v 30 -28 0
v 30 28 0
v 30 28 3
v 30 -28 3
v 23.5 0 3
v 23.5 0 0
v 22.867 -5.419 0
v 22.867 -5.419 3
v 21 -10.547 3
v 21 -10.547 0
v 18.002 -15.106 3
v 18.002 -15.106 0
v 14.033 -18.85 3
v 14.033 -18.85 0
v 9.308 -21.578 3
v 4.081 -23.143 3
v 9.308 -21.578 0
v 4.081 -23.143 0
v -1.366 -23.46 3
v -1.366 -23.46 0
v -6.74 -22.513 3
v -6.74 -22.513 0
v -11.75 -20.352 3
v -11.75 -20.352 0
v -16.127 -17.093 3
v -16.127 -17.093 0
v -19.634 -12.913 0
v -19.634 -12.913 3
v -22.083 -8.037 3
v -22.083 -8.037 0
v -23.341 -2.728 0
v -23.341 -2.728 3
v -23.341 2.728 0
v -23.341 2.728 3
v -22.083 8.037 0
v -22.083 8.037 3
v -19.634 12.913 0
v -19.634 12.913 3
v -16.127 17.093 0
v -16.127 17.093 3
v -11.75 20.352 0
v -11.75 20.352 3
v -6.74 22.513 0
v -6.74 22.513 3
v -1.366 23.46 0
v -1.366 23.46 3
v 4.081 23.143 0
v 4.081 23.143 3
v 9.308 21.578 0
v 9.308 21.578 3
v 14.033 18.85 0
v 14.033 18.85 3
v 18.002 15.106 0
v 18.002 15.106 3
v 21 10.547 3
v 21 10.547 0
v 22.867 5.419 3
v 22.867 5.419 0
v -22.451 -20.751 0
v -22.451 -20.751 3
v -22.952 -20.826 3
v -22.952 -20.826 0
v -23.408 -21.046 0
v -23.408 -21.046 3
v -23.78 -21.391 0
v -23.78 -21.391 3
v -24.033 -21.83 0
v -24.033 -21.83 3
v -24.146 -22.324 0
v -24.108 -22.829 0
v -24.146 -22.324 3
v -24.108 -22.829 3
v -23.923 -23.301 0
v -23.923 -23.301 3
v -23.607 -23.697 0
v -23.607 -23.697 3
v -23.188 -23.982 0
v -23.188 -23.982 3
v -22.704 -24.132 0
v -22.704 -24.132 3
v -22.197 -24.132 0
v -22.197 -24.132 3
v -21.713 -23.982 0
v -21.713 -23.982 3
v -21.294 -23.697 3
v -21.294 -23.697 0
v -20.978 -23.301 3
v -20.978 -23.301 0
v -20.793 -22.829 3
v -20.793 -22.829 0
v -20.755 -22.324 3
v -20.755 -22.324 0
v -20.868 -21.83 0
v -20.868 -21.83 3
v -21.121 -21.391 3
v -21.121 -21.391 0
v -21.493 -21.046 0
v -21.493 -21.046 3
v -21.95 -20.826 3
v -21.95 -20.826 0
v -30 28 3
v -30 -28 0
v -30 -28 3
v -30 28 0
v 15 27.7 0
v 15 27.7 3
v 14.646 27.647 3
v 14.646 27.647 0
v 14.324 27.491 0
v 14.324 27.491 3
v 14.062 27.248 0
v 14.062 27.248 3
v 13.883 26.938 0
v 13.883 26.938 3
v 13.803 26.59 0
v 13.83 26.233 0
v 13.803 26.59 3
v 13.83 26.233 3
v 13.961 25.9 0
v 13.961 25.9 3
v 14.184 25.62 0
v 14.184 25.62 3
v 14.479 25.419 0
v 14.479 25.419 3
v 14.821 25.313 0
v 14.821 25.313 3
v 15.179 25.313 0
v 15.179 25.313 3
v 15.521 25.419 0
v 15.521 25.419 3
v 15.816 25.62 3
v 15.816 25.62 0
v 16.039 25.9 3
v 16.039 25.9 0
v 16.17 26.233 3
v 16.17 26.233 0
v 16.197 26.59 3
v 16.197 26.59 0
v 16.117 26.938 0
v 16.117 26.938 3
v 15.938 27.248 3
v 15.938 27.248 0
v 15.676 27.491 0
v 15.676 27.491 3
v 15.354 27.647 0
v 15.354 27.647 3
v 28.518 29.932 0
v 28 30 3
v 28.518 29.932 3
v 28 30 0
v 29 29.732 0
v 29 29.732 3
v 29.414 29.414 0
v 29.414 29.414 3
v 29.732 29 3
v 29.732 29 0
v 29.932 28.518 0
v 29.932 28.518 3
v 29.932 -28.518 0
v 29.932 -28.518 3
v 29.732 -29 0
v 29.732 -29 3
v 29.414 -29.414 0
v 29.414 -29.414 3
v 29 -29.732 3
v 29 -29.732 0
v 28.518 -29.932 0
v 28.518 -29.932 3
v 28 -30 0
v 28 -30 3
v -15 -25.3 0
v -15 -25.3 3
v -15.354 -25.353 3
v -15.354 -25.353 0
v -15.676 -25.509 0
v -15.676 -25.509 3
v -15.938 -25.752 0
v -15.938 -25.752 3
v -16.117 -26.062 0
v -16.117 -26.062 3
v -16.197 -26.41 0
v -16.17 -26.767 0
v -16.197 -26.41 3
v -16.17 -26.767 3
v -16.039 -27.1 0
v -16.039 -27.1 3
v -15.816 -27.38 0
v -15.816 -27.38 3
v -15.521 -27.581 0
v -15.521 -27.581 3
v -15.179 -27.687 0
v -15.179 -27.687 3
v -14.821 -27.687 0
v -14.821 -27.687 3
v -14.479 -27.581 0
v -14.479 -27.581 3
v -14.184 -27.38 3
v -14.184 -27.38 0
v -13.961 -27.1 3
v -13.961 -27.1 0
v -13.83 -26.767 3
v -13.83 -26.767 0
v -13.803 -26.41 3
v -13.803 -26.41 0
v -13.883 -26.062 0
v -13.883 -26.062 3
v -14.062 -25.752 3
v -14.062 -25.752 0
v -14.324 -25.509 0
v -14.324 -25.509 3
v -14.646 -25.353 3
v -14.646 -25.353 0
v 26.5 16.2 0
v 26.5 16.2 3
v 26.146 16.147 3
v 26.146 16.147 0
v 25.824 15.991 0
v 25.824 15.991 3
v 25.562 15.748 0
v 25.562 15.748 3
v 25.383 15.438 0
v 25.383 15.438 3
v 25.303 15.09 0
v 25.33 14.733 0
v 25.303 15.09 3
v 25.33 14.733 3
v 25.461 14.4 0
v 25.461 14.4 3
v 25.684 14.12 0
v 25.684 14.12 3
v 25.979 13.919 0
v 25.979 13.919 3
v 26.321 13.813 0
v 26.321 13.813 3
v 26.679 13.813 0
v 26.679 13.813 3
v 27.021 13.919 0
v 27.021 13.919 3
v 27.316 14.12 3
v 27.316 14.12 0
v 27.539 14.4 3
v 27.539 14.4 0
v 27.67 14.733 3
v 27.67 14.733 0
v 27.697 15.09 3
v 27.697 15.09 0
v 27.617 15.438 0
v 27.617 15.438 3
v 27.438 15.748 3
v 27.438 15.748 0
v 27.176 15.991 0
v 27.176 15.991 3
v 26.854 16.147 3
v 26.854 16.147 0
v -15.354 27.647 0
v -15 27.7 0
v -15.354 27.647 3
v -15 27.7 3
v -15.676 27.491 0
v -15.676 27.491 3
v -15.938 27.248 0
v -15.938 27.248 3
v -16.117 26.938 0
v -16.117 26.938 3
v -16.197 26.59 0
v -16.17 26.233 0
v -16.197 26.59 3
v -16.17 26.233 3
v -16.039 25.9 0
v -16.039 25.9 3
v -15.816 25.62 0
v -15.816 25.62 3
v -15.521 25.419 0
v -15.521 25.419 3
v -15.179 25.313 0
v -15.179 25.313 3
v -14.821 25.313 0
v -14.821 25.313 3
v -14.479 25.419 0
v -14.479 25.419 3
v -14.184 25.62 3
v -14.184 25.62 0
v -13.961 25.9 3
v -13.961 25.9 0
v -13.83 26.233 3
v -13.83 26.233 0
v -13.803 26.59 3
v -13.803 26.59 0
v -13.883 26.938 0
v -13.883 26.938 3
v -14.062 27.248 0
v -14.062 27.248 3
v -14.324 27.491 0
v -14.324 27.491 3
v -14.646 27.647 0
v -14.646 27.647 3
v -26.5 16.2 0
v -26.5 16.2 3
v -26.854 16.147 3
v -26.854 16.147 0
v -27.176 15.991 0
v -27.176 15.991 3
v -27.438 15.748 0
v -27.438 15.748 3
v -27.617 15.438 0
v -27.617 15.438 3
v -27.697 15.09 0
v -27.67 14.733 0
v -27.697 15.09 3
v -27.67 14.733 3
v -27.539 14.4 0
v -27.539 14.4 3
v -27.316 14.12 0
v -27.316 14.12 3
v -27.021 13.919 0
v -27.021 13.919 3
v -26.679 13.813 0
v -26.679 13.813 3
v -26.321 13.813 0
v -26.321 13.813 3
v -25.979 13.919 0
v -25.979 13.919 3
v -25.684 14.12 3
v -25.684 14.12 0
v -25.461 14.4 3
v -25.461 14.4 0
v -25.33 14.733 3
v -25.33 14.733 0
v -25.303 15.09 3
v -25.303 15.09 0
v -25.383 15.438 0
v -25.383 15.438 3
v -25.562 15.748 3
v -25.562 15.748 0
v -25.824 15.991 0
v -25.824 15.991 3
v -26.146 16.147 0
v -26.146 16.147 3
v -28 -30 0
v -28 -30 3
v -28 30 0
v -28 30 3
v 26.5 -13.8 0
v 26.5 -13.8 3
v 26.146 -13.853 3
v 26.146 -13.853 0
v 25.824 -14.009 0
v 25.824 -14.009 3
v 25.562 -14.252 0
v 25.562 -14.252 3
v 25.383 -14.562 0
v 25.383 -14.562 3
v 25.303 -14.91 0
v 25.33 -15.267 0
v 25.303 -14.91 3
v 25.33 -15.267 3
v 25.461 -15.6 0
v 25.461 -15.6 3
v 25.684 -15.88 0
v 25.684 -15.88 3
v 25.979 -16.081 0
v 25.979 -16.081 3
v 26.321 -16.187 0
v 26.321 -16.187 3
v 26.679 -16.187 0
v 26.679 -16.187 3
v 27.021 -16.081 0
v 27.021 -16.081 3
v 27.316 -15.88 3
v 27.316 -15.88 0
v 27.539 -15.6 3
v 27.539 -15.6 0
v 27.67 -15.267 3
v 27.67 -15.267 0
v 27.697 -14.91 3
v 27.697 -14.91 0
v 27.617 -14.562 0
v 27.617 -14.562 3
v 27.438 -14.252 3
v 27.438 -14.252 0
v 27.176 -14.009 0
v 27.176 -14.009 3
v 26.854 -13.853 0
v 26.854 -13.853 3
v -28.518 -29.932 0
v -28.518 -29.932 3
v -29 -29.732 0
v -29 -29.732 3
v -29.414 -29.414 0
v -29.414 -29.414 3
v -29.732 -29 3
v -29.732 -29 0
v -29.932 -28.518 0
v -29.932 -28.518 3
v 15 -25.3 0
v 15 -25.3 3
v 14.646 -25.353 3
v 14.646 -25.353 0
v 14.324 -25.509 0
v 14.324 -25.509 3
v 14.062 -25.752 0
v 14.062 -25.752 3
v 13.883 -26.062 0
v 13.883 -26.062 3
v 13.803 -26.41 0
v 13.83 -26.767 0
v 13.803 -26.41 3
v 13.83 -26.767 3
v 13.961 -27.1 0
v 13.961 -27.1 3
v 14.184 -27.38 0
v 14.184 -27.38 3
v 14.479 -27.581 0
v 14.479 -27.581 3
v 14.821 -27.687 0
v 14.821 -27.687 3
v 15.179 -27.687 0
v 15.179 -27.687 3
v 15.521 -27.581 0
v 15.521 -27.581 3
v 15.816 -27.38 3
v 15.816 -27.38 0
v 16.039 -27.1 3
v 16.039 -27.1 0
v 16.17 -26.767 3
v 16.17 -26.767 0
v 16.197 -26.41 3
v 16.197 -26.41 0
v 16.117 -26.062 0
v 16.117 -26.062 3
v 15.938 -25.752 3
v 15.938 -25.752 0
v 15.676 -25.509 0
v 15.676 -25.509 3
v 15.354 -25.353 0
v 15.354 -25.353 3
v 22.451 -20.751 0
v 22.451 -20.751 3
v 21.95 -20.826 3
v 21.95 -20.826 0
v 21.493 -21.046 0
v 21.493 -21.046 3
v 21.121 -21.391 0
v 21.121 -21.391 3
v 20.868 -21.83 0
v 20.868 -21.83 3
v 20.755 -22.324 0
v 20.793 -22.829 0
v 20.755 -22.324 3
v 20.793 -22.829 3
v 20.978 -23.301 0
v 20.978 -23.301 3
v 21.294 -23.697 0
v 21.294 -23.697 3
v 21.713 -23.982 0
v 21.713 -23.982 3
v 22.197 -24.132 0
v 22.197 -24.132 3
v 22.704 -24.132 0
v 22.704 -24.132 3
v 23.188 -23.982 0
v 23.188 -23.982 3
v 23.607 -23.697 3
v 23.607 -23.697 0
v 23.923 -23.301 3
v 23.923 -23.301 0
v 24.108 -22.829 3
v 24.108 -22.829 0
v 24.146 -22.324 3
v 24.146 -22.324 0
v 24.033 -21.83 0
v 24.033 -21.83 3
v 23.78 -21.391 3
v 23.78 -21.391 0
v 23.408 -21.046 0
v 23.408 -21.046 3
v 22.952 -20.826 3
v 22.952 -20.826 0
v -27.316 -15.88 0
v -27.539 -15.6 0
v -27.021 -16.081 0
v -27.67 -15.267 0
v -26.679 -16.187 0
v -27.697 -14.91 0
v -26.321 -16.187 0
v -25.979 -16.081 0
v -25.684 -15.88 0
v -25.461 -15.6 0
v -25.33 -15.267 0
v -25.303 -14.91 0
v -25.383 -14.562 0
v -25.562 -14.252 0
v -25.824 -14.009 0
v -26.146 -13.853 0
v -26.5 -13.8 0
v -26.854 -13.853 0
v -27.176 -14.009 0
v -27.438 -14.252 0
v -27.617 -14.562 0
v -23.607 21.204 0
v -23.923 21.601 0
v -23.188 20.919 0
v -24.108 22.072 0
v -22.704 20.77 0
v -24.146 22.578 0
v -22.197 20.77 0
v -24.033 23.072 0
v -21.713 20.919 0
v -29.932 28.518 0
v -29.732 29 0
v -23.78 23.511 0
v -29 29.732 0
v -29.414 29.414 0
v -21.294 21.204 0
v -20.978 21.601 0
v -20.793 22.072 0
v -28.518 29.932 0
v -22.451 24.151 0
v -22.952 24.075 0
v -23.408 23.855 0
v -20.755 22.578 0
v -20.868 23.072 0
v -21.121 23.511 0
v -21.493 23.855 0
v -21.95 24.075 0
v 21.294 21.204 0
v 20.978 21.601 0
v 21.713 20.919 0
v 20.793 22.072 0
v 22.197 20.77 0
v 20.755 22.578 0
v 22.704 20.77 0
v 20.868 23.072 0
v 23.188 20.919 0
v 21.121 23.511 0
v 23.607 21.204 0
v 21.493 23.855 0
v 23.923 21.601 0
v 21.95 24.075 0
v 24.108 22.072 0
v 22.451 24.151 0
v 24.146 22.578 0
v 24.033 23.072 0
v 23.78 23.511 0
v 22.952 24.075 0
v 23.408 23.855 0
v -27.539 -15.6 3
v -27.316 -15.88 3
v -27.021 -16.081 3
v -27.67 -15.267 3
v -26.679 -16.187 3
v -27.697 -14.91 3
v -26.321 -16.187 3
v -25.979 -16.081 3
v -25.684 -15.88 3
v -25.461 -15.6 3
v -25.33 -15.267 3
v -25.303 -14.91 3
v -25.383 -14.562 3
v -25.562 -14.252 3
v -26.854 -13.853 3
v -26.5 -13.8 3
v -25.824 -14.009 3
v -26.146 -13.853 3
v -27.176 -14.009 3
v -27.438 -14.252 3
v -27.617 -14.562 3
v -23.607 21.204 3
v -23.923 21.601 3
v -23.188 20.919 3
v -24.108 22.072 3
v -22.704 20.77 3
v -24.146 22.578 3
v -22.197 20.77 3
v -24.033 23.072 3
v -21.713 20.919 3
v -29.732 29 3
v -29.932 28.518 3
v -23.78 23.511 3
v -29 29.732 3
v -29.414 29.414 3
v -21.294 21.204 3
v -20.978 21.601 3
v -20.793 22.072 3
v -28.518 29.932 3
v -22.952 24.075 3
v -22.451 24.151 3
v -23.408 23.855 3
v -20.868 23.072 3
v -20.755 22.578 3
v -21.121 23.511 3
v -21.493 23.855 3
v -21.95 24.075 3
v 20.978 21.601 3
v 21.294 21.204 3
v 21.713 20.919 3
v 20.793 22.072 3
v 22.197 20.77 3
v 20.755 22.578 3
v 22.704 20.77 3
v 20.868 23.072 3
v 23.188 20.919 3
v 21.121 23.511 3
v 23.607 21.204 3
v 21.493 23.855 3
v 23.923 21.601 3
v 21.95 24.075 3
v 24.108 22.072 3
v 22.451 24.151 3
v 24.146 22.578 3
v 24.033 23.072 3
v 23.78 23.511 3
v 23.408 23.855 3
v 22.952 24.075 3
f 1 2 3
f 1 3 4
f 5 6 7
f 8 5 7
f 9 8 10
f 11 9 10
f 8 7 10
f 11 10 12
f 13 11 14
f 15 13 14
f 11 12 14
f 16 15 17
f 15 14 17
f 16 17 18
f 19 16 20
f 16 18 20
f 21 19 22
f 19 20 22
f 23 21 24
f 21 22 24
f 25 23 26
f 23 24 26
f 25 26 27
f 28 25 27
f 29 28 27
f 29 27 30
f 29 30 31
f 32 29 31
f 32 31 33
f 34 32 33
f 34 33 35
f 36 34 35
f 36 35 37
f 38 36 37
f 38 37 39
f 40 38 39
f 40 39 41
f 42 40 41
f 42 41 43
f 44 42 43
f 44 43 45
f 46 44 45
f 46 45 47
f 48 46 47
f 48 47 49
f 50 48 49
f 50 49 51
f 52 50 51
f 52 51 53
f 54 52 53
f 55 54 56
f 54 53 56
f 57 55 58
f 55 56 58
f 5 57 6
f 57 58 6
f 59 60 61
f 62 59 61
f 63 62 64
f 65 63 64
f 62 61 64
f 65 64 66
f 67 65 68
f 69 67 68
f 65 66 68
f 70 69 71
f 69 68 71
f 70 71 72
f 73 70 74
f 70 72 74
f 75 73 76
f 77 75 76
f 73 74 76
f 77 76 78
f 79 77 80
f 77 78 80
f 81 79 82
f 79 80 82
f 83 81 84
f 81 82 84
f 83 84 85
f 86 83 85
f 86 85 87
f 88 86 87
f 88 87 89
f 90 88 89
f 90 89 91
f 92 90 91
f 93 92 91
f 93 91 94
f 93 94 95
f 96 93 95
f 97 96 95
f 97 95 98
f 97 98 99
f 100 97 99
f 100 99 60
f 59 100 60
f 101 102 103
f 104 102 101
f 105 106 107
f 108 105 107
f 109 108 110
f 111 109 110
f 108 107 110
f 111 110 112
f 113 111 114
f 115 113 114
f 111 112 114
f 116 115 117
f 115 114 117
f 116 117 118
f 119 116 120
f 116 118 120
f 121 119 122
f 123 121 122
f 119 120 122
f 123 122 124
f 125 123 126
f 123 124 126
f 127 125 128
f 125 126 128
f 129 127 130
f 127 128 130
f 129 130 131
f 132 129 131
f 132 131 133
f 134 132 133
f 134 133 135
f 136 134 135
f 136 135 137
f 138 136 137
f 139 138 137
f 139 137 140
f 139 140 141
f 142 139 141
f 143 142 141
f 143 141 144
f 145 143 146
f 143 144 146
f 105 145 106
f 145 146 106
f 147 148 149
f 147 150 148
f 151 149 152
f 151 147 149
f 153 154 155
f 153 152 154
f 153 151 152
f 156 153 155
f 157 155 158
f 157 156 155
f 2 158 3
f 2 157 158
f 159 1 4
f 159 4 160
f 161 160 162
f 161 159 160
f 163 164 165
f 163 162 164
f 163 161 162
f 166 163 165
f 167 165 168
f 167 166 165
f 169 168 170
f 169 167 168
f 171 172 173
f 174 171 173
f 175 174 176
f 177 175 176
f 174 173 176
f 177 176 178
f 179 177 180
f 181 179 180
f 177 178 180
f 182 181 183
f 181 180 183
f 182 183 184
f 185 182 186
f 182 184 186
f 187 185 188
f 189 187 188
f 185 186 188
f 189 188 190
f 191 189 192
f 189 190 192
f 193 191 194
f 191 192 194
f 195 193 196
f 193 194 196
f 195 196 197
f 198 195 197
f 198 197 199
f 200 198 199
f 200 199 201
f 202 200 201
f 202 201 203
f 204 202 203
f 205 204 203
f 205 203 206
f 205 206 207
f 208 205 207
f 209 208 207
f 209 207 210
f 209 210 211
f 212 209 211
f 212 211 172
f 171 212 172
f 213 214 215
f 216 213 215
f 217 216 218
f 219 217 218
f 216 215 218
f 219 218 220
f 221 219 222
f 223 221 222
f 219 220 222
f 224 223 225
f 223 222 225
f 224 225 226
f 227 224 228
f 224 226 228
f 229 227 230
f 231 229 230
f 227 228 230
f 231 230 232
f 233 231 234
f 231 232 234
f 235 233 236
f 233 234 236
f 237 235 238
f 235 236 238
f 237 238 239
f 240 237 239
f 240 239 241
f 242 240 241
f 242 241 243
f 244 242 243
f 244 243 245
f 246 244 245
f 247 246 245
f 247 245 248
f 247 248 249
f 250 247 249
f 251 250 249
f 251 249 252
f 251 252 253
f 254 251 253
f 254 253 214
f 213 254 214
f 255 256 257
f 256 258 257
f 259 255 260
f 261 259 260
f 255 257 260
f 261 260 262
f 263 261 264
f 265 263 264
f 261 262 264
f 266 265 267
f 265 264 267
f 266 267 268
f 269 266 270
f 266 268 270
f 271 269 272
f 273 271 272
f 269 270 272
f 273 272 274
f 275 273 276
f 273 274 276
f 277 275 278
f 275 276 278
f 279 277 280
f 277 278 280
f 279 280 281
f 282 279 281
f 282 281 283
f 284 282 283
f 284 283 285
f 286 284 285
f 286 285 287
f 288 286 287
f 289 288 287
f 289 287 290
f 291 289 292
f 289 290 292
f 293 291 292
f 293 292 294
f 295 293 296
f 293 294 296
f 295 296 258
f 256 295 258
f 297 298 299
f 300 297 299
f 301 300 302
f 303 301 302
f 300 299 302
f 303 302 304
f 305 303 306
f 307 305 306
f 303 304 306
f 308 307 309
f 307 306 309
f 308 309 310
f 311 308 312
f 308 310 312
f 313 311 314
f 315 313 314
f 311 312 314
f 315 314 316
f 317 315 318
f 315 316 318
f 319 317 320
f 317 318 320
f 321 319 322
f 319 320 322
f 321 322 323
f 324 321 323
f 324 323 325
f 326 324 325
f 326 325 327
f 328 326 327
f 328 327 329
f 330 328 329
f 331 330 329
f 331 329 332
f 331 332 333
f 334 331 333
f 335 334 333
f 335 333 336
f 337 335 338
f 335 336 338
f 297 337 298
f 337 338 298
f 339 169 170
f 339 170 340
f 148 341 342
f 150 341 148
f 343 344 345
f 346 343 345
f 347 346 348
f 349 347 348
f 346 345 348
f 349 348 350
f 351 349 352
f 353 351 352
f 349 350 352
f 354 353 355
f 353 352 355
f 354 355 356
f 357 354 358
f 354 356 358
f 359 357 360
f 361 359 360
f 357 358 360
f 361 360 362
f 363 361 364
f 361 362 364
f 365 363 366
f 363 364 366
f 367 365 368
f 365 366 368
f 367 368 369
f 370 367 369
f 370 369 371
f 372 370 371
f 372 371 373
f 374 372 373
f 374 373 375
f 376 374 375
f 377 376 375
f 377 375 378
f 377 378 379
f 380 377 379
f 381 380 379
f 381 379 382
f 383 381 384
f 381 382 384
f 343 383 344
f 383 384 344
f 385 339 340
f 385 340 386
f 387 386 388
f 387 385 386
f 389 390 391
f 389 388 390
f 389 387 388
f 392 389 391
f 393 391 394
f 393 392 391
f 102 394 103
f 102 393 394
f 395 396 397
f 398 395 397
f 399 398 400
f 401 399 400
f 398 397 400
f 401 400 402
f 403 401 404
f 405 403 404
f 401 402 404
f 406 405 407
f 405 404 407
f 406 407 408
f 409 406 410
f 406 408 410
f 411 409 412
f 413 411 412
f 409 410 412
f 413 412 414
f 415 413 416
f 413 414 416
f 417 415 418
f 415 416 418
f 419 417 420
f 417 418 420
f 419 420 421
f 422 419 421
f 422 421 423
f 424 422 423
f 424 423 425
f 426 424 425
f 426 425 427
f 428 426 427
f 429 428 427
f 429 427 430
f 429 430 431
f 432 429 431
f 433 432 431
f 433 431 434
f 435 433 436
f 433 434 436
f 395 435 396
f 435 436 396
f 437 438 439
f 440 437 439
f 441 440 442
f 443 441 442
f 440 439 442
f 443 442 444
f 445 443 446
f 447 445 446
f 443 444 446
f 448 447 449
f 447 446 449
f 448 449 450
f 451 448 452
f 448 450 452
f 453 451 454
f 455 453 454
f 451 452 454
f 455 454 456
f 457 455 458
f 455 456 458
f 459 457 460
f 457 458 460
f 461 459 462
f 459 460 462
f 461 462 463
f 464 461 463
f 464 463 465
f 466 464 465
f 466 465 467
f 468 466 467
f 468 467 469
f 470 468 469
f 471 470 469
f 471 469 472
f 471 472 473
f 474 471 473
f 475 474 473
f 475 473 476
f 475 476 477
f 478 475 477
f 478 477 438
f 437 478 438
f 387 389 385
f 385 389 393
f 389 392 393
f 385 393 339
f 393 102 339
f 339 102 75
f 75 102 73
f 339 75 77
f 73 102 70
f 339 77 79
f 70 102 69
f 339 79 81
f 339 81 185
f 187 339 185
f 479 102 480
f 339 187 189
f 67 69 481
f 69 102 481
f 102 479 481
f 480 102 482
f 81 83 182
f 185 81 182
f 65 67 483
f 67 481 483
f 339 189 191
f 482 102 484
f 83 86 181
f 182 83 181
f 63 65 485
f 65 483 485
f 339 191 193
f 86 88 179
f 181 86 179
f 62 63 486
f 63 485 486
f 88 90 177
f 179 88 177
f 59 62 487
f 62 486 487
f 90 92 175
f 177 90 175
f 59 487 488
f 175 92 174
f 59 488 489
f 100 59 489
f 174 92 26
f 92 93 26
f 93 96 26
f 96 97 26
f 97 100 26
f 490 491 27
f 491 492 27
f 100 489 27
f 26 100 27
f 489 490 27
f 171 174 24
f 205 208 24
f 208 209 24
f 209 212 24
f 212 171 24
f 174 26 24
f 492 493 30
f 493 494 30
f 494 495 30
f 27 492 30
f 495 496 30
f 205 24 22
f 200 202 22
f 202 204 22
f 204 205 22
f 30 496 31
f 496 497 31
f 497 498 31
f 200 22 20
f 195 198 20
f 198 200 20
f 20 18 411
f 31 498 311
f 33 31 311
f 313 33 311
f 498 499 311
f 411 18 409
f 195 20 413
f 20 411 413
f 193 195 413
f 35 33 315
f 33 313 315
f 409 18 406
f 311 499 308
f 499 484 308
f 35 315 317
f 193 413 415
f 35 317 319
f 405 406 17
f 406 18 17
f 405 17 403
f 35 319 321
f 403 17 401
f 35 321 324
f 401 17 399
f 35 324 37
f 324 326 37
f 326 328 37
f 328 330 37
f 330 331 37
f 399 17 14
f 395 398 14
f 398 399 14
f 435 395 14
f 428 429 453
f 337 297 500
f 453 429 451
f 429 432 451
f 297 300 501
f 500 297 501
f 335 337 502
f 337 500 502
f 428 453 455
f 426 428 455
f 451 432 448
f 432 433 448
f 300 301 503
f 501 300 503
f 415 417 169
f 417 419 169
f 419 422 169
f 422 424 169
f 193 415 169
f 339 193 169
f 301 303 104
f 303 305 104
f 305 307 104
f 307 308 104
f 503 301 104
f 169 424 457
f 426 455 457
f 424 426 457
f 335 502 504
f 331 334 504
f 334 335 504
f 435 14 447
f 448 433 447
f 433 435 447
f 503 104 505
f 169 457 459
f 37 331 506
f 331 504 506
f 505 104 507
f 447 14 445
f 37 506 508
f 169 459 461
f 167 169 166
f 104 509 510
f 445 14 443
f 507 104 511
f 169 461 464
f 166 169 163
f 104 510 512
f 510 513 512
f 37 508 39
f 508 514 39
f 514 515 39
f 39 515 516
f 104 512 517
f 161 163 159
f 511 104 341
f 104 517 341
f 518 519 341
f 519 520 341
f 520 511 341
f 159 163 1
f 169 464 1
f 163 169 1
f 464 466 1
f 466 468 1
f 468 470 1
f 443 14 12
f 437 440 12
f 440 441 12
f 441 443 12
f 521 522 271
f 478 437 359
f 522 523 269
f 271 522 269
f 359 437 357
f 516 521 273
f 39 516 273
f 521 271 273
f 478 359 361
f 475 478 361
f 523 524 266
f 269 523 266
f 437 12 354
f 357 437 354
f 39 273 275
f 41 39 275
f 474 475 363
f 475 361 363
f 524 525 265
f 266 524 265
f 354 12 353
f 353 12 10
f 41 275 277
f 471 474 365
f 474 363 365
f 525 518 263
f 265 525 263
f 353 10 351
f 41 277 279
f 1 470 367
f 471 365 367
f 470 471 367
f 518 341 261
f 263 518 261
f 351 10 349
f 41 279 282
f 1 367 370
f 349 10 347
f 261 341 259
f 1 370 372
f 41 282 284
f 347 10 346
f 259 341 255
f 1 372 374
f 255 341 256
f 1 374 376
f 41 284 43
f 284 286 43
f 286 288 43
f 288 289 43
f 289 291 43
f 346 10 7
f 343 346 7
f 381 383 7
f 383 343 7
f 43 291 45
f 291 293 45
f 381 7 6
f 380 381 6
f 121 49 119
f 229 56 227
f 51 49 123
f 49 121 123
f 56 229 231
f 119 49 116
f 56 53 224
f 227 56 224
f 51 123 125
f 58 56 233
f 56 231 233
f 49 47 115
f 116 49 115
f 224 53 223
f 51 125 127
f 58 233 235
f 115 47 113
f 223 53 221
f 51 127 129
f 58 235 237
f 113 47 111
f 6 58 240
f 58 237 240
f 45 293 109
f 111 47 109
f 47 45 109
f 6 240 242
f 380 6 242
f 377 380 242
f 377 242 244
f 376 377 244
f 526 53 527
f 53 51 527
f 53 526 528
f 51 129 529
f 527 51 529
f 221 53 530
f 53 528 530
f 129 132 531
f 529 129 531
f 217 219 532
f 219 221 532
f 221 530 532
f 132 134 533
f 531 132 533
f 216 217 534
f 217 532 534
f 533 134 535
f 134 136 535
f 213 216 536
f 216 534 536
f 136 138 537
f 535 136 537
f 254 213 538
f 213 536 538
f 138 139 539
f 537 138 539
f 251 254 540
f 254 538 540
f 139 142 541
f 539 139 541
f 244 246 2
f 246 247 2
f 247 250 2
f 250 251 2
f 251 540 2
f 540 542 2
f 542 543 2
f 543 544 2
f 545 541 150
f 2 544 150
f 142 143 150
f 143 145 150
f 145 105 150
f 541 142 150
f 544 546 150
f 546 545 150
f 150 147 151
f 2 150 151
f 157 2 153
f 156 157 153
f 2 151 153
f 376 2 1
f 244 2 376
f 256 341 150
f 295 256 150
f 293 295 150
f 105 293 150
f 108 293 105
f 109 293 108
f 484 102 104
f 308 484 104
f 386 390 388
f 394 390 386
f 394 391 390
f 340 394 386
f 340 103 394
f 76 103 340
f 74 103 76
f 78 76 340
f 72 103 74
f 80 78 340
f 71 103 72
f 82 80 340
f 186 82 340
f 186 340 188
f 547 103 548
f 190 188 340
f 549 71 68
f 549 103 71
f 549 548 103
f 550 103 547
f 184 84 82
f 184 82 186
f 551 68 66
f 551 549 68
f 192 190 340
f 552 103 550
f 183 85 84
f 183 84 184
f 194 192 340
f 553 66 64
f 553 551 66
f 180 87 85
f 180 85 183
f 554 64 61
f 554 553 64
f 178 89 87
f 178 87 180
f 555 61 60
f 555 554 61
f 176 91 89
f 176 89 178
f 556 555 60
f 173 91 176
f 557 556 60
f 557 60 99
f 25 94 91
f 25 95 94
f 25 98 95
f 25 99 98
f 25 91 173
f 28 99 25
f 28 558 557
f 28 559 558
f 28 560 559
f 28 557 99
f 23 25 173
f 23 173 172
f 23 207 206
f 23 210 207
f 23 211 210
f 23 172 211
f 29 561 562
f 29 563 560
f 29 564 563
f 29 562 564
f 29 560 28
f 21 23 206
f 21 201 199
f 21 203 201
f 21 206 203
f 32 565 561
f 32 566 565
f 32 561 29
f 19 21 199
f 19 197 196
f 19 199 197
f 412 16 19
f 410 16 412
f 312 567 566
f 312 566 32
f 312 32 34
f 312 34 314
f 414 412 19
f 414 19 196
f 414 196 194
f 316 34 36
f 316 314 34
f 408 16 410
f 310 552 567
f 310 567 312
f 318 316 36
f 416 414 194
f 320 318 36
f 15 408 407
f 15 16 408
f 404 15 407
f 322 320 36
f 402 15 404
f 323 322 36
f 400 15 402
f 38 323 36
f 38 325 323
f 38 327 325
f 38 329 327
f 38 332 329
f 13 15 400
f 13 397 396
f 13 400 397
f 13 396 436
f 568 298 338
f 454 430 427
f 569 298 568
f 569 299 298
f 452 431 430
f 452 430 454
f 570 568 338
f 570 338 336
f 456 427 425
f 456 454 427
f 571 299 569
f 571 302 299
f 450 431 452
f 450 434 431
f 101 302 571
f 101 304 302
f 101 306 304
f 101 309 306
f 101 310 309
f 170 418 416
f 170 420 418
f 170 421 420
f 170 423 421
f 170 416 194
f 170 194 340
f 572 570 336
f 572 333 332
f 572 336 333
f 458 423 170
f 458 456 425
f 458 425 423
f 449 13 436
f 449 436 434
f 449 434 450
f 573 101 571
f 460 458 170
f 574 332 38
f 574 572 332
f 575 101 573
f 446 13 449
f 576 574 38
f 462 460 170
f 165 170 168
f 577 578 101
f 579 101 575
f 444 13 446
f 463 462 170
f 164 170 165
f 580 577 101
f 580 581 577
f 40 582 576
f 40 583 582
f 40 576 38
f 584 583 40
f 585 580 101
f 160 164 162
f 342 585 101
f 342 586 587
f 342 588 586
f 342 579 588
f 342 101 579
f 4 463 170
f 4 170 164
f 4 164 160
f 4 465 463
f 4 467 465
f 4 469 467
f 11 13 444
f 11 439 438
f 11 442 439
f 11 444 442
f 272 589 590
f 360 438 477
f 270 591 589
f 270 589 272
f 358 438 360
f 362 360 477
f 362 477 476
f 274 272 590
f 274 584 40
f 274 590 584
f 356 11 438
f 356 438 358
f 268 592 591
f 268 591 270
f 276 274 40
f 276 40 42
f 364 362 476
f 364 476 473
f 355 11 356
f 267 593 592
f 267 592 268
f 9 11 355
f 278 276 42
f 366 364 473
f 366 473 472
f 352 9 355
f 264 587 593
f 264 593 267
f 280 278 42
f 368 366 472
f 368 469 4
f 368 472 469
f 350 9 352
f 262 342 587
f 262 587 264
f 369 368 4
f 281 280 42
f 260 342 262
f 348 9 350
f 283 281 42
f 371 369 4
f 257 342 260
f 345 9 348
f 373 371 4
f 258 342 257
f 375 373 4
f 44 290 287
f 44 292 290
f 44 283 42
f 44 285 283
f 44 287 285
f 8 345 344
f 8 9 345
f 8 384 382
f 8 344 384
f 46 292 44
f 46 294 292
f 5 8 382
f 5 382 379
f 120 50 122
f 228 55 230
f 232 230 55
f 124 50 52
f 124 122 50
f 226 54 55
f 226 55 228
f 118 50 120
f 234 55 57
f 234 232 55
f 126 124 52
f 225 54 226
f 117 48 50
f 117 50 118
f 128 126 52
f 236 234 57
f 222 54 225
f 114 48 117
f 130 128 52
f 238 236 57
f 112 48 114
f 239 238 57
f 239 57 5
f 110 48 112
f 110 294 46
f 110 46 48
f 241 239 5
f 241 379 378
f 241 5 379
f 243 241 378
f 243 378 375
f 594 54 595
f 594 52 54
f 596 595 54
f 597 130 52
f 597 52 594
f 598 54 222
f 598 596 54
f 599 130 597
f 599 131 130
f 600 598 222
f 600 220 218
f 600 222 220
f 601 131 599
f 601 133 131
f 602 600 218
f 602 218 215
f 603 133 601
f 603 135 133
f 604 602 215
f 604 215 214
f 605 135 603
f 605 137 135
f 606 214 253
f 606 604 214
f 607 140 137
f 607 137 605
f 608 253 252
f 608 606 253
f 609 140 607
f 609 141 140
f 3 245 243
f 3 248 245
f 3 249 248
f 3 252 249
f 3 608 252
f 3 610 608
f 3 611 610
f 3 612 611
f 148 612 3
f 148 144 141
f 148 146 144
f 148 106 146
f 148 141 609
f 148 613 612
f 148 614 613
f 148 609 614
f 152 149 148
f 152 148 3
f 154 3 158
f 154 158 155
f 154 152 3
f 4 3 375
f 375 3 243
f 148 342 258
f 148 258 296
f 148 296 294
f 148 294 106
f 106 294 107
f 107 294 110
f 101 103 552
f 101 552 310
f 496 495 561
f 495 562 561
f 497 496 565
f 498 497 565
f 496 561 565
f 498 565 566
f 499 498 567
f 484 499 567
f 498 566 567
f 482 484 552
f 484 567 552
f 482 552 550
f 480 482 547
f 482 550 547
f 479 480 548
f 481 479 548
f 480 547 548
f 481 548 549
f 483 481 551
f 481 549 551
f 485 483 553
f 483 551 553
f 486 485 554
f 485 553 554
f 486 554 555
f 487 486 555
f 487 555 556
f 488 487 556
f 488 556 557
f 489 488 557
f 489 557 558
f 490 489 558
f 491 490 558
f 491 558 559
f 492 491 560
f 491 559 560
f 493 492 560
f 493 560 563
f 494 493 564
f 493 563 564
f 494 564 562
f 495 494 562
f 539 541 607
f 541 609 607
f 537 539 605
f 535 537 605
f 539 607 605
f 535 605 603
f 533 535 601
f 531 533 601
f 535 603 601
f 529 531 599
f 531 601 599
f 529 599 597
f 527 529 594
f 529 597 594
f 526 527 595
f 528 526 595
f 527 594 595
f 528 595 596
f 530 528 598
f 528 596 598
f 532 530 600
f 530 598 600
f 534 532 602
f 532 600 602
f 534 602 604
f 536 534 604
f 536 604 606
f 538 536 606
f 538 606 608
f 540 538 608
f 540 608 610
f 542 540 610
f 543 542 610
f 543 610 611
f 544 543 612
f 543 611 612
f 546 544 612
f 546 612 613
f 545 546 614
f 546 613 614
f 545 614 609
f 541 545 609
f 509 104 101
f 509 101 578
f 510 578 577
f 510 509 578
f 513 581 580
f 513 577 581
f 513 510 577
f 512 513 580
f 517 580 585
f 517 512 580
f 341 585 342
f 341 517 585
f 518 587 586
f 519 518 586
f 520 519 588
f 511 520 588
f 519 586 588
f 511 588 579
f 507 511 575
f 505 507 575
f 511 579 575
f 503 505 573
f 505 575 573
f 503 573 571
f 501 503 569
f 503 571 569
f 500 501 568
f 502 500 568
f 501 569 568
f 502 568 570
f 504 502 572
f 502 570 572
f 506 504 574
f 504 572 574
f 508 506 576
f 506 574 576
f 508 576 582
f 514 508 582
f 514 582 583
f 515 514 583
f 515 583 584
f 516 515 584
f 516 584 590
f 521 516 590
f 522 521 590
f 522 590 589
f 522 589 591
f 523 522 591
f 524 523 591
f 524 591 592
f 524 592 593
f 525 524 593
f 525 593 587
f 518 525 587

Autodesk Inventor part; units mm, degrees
ref_plane "YZ Plane" through (0, 0, 0) normal (1, 0, 0) x (0, 1, 0)
ref_plane "XZ Plane" through (0, 0, 0) normal (0, 1, 0) x (-1, 0, 0)
ref_plane "XY Plane" through (0, 0, 0) normal (0, 0, 1) x (1, 0, 0)
sketch "Sketch1" plane through (0, 0, 0) normal (0, 0, 1) x (1, 0, 0)
  line L0 (0, -42.5799) -> (0, 42.5799) projected
  line L1 (-42.5799, 0) -> (42.5799, 0) projected
  line L2 (-28, 30) -> (28, 30)
  line L3 (30, 28) -> (30, -28)
  line L4 (28, -30) -> (-28, -30)
  line L5 (-30, -28) -> (-30, 28)
  arc A0 (-28, 30) -> (-30, 28) centre (-28, 28) ccw
  arc A1 (30, 28) -> (28, 30) centre (28, 28) ccw
  arc A2 (28, -30) -> (30, -28) centre (28, -28) ccw
  arc A3 (-30, -28) -> (-28, -30) centre (-28, -28) ccw
  circle A4 centre (0, 0) radius 23.5
  point P0 (-30, 30)
  point P1 (30, 30)
  point P2 (-22.4506, 22.4506)
  point P3 (-26.5, 15)
  point P4 (-15, 26.5)
  point P5 (-15, -26.5)
  point P6 (-22.4506, -22.4506)
  point P7 (-26.5, -15)
  point P8 (26.5, -15)
  point P9 (22.4506, -22.4506)
  point P10 (15, -26.5)
  point P11 (15, 26.5)
  point P12 (22.4506, 22.4506)
  point P13 (26.5, 15)
  point P14 (-21, 0)
  point P15 (21, 0)
  point P16 (-4.25, 0)
  point P17 (4.25, 0)
  point P18 (-24.6219, 5.3878)
  dimension "d0" = 60
  dimension "d1" = 2
  dimension "d2" = 22.4506
  dimension "d3" = 22.4506
  dimension "d4" = 15
  dimension "d5" = 15
  dimension "d6" = 3.5
  dimension "d7" = 3.5
  dimension "d10" = 360
  dimension "d28" = 9
  dimension "d36" = 25.75
  dimension "d48" = 47
extrude "Extrusion2" add sketch "Sketch1" along normal blind 3 contours L4 A3 L5 L1 A4 L0 | L0 A4 L1 L3 A2 L4 | L1 L5 A0 L2 L0 A4 | A4 L0 L2 A1 L3 L1
hole "Hole5" at (15, -26.5, 0) at (26.5, -15, 0) at (-15, -26.5, 0) at (-26.5, -15, 0) at (-26.5, 15, 0) at (-15, 26.5, 0) at (15, 26.5, 0) at (26.5, 15, 0) direction (0, 0, 1) diameter 2.4 end through all clearance for "Countersunk Flat Head Screw DIN EN ISO 2009" size "M2" standard "DIN"
hole "Hole6" at (-22.4506, 22.4506, 0) at (-22.4506, -22.4506, 0) at (22.4506, -22.4506, 0) at (22.4506, 22.4506, 0) direction (0, 0, 1) diameter 3.4 end through all clearance for "Countersunk Flat Head Screw DIN EN ISO 2009" size "M3" standard "DIN"
equation "\"d0\" = backplate_width"
equation "\"d2\" = hole_distance"
equation "\"d3\" = hole_distance"
equation "\"d4\" = screw_distance_center"
equation "\"d5\" = screw_distance_center"
equation "\"d6\" = screw_distance_outside"
equation "\"d7\" = screw_distance_outside"
equation "\"d48\" = circle_dimension_inner"
equation "\"encoder_axis\" = 8"
equation "\"encoder_emboss\" = 0"
equation "\"encoders\" = 0"
equation "\"encoder_width\" = 27"
equation "\"front_plate_thickness\" = 2"
equation "\"glass_thickness\" = 2"
equation "\"screw_distance_outside\" = 3.5"
equation "\"encoder_rad\" = 49"
equation "\"encoder_extrude_hight\" = 3"
equation "\"screw_distance_center\" = 15"
equation "\"ring_top_thickness\" = 2"
equation "\"ring_outer_bevel_depth\" = 0.5"
equation "\"ring_depth\" = 6"
equation "\"ring_outer_bevel_height\" = 3"
equation "\"ring_inner_bevel_depth\" = 3.5"
equation "\"ring_thickness\" = 9"
equation "\"hole_from_center\" = 63.5"
equation "\"circle_dimension_inner\" = 47"
equation "\"circle_dimension\" = 56"
equation "\"backplate_width\" = 60"
equation "\"hole_distance\" = 22.45064"
properties part number "filler_ring-03" material "ABS Plastic"
